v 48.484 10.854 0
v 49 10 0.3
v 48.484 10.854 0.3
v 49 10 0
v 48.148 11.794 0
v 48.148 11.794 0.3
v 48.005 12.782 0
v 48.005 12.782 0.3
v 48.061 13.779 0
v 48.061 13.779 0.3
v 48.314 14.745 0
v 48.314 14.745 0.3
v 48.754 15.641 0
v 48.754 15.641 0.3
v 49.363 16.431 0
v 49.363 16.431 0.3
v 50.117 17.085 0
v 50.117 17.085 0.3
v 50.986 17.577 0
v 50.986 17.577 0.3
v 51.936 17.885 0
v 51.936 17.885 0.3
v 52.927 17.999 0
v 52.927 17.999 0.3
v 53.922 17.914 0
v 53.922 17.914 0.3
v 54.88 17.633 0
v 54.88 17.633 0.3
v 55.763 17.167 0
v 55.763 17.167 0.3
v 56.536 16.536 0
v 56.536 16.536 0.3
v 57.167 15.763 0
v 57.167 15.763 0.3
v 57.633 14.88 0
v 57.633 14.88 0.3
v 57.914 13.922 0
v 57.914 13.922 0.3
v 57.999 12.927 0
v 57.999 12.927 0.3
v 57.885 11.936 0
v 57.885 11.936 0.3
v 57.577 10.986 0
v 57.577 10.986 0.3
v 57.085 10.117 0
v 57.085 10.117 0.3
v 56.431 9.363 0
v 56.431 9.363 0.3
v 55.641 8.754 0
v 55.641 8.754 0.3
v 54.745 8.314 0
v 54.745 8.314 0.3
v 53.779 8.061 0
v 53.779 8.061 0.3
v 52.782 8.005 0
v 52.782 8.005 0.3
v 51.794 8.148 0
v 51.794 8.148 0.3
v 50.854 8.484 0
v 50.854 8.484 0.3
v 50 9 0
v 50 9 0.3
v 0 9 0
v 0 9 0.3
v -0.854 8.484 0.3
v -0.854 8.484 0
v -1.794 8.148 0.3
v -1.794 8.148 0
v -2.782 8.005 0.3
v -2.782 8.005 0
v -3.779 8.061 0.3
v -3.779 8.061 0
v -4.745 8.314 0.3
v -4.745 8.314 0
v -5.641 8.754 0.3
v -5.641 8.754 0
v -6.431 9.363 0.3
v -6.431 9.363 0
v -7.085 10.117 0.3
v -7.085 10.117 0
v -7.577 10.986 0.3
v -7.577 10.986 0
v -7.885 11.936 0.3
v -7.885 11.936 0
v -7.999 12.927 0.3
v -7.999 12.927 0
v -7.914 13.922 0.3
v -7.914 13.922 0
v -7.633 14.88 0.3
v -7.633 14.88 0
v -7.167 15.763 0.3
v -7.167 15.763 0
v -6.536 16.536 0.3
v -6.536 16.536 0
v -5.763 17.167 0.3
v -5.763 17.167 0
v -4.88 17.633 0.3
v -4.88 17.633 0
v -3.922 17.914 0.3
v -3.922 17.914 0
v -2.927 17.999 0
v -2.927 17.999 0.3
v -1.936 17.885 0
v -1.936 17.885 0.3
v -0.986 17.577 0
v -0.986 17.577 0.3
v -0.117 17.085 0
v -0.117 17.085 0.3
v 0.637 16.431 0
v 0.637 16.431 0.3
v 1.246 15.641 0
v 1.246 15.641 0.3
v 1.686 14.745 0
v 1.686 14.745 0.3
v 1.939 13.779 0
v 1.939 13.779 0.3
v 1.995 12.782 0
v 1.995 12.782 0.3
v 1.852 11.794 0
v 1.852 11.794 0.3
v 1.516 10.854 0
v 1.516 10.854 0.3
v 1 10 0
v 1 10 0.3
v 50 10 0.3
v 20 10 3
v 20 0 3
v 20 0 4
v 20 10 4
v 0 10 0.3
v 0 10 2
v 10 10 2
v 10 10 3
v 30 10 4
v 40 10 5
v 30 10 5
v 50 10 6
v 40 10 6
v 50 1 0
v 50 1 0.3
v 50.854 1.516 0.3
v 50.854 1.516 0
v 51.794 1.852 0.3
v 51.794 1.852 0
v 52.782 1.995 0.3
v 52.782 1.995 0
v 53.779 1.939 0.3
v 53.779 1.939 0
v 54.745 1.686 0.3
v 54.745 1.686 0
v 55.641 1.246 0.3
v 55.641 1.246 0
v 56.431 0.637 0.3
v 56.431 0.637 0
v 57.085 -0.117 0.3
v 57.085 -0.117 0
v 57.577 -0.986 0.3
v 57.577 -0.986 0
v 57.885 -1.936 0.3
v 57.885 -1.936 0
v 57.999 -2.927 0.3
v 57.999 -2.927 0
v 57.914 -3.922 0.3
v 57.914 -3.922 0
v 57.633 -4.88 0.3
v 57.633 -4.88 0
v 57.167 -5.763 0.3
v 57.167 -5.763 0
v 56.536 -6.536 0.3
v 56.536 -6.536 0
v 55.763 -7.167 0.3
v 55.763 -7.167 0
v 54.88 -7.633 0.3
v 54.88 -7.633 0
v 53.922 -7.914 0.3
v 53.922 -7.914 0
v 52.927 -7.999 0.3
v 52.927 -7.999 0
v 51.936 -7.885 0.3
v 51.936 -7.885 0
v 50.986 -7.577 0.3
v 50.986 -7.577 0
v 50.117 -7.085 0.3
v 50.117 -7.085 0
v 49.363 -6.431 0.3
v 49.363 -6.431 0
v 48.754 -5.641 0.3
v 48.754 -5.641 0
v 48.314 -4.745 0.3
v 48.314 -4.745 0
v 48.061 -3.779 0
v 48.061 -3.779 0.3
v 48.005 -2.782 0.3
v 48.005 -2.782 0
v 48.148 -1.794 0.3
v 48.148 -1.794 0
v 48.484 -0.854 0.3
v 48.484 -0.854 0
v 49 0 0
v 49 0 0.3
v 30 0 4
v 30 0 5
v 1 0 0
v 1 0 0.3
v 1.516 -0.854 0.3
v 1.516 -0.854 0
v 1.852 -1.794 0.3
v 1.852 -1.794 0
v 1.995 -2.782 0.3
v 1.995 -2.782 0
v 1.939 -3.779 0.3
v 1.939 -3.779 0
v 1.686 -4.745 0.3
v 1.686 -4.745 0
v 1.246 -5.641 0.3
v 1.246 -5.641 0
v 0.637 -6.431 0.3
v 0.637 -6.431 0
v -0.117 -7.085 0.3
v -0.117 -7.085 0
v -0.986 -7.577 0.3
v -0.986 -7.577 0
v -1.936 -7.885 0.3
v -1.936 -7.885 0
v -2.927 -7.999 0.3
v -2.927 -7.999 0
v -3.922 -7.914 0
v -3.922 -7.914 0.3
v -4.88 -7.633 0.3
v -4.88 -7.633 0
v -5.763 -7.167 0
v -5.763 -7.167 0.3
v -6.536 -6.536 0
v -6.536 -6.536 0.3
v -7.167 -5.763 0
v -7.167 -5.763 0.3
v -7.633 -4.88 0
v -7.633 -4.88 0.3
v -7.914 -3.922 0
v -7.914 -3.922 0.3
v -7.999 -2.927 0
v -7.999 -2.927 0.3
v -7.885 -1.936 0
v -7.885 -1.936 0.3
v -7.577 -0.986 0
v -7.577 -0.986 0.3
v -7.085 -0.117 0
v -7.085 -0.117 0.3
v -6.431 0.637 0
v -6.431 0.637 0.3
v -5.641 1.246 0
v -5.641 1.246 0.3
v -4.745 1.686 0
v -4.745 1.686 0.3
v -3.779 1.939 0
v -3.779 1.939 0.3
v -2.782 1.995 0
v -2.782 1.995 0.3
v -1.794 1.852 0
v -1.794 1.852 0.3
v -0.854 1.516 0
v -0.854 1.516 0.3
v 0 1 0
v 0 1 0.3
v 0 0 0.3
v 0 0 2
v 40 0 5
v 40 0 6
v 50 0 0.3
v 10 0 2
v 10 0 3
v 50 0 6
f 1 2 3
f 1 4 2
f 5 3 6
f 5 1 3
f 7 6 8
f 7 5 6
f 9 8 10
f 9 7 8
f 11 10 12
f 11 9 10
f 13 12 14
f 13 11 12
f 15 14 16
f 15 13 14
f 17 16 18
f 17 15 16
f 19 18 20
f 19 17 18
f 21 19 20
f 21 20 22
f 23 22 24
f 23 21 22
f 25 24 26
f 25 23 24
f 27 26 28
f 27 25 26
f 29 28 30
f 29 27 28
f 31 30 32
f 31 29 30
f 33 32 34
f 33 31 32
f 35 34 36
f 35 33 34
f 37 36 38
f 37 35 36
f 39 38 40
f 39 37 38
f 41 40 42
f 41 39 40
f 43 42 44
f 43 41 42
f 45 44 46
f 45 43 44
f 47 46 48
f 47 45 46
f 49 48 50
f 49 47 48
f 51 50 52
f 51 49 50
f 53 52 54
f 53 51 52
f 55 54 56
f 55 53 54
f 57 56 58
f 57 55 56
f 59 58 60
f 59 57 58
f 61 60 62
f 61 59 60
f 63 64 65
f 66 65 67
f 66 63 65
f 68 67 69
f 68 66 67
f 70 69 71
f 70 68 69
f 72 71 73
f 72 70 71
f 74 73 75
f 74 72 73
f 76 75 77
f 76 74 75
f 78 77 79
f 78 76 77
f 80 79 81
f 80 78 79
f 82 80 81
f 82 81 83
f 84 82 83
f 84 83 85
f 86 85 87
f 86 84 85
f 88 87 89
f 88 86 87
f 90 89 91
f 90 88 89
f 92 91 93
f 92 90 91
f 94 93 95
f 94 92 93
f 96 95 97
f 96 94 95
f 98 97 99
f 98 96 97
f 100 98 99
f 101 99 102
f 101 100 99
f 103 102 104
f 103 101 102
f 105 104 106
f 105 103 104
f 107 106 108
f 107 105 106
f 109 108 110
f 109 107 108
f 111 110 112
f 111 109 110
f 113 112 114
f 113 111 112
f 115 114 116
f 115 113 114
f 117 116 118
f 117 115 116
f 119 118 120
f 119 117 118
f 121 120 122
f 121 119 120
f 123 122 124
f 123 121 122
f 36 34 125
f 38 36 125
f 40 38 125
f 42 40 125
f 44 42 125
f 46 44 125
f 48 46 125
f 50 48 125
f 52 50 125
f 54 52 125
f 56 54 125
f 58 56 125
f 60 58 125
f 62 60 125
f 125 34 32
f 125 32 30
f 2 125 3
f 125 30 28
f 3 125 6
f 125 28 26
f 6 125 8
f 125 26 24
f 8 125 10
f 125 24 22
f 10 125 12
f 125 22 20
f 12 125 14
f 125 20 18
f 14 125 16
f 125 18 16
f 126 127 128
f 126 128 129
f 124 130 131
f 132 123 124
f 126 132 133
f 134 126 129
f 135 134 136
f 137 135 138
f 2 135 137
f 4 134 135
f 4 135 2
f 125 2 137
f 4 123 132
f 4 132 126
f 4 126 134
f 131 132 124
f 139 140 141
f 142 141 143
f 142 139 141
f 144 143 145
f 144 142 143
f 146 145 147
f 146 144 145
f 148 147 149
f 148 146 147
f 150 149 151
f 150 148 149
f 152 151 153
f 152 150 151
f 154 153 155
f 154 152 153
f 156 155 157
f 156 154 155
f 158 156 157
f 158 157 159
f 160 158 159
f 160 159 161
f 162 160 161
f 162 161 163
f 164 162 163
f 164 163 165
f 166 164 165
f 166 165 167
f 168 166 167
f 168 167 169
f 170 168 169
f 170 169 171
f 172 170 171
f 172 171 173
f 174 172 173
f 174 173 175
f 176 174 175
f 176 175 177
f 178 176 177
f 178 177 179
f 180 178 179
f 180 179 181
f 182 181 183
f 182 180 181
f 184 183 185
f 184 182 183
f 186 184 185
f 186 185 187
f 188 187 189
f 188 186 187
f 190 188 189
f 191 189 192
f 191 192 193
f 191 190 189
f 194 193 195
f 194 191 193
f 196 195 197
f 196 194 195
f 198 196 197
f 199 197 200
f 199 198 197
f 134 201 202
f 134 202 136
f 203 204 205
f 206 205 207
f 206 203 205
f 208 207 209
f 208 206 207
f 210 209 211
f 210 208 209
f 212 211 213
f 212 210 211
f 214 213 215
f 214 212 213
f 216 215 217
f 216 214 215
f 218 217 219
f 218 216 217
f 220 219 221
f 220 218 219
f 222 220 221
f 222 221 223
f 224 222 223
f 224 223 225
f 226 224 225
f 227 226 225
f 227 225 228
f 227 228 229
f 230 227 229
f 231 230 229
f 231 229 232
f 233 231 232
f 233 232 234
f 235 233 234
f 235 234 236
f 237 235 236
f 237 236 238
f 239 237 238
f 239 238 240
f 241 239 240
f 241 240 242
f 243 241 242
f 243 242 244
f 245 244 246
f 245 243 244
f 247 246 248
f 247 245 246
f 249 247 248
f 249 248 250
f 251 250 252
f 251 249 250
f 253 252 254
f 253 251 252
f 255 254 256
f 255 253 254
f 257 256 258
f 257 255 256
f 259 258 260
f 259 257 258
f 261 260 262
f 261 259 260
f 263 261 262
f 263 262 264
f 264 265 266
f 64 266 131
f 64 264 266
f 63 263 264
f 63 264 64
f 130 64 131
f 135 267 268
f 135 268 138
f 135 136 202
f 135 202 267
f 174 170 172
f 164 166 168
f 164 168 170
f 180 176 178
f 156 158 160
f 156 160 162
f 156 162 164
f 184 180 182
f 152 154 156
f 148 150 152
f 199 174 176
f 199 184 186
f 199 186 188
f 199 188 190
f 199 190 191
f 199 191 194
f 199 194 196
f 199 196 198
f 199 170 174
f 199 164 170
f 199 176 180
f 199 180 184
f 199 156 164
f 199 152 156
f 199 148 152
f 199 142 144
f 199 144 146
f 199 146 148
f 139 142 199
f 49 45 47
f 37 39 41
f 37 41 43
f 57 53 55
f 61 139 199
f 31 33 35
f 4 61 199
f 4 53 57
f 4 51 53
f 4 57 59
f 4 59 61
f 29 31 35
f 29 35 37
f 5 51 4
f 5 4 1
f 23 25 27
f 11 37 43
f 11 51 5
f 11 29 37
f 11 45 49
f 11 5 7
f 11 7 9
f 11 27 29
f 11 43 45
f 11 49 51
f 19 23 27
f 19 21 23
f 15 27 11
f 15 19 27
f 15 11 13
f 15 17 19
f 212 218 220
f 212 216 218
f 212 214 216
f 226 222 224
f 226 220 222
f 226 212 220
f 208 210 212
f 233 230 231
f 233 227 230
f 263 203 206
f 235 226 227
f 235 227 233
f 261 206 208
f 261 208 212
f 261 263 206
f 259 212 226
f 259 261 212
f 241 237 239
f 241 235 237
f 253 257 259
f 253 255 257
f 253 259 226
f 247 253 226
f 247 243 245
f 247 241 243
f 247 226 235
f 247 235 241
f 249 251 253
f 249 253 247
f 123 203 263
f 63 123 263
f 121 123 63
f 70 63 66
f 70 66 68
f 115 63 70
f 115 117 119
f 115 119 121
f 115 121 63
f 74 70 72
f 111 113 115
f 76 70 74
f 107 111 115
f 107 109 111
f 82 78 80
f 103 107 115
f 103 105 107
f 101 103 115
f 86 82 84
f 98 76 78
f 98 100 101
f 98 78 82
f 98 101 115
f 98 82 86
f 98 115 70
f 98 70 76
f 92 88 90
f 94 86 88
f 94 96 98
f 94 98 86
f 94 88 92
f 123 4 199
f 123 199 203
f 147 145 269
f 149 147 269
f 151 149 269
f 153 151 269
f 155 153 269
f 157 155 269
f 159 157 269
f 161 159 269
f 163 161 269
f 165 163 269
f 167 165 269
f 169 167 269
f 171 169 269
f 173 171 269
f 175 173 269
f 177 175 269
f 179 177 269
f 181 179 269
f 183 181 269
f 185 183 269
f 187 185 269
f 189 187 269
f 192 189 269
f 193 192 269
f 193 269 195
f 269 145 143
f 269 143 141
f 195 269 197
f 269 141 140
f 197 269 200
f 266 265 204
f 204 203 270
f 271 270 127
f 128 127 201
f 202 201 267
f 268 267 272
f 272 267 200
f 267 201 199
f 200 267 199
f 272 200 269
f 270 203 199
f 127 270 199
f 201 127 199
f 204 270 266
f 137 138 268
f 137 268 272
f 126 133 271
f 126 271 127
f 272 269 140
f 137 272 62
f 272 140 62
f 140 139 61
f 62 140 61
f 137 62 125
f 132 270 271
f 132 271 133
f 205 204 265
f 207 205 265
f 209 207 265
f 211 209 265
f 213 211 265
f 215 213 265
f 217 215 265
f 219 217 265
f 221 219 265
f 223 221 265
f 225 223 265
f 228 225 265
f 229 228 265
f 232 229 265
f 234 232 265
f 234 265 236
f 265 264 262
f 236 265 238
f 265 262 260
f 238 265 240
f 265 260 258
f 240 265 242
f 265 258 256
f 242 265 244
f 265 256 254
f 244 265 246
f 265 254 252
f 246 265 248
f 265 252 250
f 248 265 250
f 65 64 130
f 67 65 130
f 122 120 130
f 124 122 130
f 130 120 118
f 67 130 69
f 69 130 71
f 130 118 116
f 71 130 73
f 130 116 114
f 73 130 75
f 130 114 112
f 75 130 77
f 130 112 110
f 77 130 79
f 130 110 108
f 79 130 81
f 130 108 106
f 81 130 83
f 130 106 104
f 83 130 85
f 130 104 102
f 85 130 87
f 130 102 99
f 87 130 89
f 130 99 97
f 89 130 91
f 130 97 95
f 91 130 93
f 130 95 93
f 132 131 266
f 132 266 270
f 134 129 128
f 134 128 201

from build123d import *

# Parameters (mm, degrees)
SKETCH1_W        = 50
SKETCH1_H        = 10
F_2MM_DEPTH      = 2
SKETCH2_W        = 40
SKETCH2_H        = 10
F_3MM_DEPTH      = 1
SKETCH3_W        = 30
SKETCH3_H        = 10
F_4MM_DEPTH      = 1
SKETCH4_W        = 20
SKETCH4_H        = 10
F_5MM_DEPTH      = 1
SKETCH5_W        = 10
SKETCH5_H        = 10
F_6MM_DEPTH      = 1
SKETCH6_R        = 5
PRINT_EARS_DEPTH = 0.3


with BuildPart() as part:
    # Sketch1 → 2mm (new body)
    with BuildSketch(Plane.XY):
        with Locations((25, 5)):
            Rectangle(SKETCH1_W, SKETCH1_H)
    extrude(amount=F_2MM_DEPTH)

    # Sketch2 → 3mm (add)
    with BuildSketch(Plane.XY.offset(2)):
        with Locations((30, 5)):
            Rectangle(SKETCH2_W, SKETCH2_H)
    extrude(amount=F_3MM_DEPTH)

    # Sketch3 → 4mm (add)
    with BuildSketch(Plane.XY.offset(3)):
        with Locations((35, 5)):
            Rectangle(SKETCH3_W, SKETCH3_H)
    extrude(amount=F_4MM_DEPTH)

    # Sketch4 → 5mm (add)
    with BuildSketch(Plane.XY.offset(4)):
        with Locations((40, 5)):
            Rectangle(SKETCH4_W, SKETCH4_H)
    extrude(amount=F_5MM_DEPTH)

    # Sketch5 → 6mm (add)
    with BuildSketch(Plane.XY.offset(5)):
        with Locations((45, 5)):
            Rectangle(SKETCH5_W, SKETCH5_H)
    extrude(amount=F_6MM_DEPTH)

    # Sketch6 → Print ears (add)
    with BuildSketch(Plane(origin=(0, 0, 0), x_dir=(-1, 0, 0), z_dir=(0, 0, -1))):
        with Locations((3, -3)):
            Circle(SKETCH6_R)
        with Locations((3, 13)):
            Circle(SKETCH6_R)
        with Locations((-53, 13)):
            Circle(SKETCH6_R)
        with Locations((-53, -3)):
            Circle(SKETCH6_R)
    extrude(amount=-PRINT_EARS_DEPTH)


solid = part.part
